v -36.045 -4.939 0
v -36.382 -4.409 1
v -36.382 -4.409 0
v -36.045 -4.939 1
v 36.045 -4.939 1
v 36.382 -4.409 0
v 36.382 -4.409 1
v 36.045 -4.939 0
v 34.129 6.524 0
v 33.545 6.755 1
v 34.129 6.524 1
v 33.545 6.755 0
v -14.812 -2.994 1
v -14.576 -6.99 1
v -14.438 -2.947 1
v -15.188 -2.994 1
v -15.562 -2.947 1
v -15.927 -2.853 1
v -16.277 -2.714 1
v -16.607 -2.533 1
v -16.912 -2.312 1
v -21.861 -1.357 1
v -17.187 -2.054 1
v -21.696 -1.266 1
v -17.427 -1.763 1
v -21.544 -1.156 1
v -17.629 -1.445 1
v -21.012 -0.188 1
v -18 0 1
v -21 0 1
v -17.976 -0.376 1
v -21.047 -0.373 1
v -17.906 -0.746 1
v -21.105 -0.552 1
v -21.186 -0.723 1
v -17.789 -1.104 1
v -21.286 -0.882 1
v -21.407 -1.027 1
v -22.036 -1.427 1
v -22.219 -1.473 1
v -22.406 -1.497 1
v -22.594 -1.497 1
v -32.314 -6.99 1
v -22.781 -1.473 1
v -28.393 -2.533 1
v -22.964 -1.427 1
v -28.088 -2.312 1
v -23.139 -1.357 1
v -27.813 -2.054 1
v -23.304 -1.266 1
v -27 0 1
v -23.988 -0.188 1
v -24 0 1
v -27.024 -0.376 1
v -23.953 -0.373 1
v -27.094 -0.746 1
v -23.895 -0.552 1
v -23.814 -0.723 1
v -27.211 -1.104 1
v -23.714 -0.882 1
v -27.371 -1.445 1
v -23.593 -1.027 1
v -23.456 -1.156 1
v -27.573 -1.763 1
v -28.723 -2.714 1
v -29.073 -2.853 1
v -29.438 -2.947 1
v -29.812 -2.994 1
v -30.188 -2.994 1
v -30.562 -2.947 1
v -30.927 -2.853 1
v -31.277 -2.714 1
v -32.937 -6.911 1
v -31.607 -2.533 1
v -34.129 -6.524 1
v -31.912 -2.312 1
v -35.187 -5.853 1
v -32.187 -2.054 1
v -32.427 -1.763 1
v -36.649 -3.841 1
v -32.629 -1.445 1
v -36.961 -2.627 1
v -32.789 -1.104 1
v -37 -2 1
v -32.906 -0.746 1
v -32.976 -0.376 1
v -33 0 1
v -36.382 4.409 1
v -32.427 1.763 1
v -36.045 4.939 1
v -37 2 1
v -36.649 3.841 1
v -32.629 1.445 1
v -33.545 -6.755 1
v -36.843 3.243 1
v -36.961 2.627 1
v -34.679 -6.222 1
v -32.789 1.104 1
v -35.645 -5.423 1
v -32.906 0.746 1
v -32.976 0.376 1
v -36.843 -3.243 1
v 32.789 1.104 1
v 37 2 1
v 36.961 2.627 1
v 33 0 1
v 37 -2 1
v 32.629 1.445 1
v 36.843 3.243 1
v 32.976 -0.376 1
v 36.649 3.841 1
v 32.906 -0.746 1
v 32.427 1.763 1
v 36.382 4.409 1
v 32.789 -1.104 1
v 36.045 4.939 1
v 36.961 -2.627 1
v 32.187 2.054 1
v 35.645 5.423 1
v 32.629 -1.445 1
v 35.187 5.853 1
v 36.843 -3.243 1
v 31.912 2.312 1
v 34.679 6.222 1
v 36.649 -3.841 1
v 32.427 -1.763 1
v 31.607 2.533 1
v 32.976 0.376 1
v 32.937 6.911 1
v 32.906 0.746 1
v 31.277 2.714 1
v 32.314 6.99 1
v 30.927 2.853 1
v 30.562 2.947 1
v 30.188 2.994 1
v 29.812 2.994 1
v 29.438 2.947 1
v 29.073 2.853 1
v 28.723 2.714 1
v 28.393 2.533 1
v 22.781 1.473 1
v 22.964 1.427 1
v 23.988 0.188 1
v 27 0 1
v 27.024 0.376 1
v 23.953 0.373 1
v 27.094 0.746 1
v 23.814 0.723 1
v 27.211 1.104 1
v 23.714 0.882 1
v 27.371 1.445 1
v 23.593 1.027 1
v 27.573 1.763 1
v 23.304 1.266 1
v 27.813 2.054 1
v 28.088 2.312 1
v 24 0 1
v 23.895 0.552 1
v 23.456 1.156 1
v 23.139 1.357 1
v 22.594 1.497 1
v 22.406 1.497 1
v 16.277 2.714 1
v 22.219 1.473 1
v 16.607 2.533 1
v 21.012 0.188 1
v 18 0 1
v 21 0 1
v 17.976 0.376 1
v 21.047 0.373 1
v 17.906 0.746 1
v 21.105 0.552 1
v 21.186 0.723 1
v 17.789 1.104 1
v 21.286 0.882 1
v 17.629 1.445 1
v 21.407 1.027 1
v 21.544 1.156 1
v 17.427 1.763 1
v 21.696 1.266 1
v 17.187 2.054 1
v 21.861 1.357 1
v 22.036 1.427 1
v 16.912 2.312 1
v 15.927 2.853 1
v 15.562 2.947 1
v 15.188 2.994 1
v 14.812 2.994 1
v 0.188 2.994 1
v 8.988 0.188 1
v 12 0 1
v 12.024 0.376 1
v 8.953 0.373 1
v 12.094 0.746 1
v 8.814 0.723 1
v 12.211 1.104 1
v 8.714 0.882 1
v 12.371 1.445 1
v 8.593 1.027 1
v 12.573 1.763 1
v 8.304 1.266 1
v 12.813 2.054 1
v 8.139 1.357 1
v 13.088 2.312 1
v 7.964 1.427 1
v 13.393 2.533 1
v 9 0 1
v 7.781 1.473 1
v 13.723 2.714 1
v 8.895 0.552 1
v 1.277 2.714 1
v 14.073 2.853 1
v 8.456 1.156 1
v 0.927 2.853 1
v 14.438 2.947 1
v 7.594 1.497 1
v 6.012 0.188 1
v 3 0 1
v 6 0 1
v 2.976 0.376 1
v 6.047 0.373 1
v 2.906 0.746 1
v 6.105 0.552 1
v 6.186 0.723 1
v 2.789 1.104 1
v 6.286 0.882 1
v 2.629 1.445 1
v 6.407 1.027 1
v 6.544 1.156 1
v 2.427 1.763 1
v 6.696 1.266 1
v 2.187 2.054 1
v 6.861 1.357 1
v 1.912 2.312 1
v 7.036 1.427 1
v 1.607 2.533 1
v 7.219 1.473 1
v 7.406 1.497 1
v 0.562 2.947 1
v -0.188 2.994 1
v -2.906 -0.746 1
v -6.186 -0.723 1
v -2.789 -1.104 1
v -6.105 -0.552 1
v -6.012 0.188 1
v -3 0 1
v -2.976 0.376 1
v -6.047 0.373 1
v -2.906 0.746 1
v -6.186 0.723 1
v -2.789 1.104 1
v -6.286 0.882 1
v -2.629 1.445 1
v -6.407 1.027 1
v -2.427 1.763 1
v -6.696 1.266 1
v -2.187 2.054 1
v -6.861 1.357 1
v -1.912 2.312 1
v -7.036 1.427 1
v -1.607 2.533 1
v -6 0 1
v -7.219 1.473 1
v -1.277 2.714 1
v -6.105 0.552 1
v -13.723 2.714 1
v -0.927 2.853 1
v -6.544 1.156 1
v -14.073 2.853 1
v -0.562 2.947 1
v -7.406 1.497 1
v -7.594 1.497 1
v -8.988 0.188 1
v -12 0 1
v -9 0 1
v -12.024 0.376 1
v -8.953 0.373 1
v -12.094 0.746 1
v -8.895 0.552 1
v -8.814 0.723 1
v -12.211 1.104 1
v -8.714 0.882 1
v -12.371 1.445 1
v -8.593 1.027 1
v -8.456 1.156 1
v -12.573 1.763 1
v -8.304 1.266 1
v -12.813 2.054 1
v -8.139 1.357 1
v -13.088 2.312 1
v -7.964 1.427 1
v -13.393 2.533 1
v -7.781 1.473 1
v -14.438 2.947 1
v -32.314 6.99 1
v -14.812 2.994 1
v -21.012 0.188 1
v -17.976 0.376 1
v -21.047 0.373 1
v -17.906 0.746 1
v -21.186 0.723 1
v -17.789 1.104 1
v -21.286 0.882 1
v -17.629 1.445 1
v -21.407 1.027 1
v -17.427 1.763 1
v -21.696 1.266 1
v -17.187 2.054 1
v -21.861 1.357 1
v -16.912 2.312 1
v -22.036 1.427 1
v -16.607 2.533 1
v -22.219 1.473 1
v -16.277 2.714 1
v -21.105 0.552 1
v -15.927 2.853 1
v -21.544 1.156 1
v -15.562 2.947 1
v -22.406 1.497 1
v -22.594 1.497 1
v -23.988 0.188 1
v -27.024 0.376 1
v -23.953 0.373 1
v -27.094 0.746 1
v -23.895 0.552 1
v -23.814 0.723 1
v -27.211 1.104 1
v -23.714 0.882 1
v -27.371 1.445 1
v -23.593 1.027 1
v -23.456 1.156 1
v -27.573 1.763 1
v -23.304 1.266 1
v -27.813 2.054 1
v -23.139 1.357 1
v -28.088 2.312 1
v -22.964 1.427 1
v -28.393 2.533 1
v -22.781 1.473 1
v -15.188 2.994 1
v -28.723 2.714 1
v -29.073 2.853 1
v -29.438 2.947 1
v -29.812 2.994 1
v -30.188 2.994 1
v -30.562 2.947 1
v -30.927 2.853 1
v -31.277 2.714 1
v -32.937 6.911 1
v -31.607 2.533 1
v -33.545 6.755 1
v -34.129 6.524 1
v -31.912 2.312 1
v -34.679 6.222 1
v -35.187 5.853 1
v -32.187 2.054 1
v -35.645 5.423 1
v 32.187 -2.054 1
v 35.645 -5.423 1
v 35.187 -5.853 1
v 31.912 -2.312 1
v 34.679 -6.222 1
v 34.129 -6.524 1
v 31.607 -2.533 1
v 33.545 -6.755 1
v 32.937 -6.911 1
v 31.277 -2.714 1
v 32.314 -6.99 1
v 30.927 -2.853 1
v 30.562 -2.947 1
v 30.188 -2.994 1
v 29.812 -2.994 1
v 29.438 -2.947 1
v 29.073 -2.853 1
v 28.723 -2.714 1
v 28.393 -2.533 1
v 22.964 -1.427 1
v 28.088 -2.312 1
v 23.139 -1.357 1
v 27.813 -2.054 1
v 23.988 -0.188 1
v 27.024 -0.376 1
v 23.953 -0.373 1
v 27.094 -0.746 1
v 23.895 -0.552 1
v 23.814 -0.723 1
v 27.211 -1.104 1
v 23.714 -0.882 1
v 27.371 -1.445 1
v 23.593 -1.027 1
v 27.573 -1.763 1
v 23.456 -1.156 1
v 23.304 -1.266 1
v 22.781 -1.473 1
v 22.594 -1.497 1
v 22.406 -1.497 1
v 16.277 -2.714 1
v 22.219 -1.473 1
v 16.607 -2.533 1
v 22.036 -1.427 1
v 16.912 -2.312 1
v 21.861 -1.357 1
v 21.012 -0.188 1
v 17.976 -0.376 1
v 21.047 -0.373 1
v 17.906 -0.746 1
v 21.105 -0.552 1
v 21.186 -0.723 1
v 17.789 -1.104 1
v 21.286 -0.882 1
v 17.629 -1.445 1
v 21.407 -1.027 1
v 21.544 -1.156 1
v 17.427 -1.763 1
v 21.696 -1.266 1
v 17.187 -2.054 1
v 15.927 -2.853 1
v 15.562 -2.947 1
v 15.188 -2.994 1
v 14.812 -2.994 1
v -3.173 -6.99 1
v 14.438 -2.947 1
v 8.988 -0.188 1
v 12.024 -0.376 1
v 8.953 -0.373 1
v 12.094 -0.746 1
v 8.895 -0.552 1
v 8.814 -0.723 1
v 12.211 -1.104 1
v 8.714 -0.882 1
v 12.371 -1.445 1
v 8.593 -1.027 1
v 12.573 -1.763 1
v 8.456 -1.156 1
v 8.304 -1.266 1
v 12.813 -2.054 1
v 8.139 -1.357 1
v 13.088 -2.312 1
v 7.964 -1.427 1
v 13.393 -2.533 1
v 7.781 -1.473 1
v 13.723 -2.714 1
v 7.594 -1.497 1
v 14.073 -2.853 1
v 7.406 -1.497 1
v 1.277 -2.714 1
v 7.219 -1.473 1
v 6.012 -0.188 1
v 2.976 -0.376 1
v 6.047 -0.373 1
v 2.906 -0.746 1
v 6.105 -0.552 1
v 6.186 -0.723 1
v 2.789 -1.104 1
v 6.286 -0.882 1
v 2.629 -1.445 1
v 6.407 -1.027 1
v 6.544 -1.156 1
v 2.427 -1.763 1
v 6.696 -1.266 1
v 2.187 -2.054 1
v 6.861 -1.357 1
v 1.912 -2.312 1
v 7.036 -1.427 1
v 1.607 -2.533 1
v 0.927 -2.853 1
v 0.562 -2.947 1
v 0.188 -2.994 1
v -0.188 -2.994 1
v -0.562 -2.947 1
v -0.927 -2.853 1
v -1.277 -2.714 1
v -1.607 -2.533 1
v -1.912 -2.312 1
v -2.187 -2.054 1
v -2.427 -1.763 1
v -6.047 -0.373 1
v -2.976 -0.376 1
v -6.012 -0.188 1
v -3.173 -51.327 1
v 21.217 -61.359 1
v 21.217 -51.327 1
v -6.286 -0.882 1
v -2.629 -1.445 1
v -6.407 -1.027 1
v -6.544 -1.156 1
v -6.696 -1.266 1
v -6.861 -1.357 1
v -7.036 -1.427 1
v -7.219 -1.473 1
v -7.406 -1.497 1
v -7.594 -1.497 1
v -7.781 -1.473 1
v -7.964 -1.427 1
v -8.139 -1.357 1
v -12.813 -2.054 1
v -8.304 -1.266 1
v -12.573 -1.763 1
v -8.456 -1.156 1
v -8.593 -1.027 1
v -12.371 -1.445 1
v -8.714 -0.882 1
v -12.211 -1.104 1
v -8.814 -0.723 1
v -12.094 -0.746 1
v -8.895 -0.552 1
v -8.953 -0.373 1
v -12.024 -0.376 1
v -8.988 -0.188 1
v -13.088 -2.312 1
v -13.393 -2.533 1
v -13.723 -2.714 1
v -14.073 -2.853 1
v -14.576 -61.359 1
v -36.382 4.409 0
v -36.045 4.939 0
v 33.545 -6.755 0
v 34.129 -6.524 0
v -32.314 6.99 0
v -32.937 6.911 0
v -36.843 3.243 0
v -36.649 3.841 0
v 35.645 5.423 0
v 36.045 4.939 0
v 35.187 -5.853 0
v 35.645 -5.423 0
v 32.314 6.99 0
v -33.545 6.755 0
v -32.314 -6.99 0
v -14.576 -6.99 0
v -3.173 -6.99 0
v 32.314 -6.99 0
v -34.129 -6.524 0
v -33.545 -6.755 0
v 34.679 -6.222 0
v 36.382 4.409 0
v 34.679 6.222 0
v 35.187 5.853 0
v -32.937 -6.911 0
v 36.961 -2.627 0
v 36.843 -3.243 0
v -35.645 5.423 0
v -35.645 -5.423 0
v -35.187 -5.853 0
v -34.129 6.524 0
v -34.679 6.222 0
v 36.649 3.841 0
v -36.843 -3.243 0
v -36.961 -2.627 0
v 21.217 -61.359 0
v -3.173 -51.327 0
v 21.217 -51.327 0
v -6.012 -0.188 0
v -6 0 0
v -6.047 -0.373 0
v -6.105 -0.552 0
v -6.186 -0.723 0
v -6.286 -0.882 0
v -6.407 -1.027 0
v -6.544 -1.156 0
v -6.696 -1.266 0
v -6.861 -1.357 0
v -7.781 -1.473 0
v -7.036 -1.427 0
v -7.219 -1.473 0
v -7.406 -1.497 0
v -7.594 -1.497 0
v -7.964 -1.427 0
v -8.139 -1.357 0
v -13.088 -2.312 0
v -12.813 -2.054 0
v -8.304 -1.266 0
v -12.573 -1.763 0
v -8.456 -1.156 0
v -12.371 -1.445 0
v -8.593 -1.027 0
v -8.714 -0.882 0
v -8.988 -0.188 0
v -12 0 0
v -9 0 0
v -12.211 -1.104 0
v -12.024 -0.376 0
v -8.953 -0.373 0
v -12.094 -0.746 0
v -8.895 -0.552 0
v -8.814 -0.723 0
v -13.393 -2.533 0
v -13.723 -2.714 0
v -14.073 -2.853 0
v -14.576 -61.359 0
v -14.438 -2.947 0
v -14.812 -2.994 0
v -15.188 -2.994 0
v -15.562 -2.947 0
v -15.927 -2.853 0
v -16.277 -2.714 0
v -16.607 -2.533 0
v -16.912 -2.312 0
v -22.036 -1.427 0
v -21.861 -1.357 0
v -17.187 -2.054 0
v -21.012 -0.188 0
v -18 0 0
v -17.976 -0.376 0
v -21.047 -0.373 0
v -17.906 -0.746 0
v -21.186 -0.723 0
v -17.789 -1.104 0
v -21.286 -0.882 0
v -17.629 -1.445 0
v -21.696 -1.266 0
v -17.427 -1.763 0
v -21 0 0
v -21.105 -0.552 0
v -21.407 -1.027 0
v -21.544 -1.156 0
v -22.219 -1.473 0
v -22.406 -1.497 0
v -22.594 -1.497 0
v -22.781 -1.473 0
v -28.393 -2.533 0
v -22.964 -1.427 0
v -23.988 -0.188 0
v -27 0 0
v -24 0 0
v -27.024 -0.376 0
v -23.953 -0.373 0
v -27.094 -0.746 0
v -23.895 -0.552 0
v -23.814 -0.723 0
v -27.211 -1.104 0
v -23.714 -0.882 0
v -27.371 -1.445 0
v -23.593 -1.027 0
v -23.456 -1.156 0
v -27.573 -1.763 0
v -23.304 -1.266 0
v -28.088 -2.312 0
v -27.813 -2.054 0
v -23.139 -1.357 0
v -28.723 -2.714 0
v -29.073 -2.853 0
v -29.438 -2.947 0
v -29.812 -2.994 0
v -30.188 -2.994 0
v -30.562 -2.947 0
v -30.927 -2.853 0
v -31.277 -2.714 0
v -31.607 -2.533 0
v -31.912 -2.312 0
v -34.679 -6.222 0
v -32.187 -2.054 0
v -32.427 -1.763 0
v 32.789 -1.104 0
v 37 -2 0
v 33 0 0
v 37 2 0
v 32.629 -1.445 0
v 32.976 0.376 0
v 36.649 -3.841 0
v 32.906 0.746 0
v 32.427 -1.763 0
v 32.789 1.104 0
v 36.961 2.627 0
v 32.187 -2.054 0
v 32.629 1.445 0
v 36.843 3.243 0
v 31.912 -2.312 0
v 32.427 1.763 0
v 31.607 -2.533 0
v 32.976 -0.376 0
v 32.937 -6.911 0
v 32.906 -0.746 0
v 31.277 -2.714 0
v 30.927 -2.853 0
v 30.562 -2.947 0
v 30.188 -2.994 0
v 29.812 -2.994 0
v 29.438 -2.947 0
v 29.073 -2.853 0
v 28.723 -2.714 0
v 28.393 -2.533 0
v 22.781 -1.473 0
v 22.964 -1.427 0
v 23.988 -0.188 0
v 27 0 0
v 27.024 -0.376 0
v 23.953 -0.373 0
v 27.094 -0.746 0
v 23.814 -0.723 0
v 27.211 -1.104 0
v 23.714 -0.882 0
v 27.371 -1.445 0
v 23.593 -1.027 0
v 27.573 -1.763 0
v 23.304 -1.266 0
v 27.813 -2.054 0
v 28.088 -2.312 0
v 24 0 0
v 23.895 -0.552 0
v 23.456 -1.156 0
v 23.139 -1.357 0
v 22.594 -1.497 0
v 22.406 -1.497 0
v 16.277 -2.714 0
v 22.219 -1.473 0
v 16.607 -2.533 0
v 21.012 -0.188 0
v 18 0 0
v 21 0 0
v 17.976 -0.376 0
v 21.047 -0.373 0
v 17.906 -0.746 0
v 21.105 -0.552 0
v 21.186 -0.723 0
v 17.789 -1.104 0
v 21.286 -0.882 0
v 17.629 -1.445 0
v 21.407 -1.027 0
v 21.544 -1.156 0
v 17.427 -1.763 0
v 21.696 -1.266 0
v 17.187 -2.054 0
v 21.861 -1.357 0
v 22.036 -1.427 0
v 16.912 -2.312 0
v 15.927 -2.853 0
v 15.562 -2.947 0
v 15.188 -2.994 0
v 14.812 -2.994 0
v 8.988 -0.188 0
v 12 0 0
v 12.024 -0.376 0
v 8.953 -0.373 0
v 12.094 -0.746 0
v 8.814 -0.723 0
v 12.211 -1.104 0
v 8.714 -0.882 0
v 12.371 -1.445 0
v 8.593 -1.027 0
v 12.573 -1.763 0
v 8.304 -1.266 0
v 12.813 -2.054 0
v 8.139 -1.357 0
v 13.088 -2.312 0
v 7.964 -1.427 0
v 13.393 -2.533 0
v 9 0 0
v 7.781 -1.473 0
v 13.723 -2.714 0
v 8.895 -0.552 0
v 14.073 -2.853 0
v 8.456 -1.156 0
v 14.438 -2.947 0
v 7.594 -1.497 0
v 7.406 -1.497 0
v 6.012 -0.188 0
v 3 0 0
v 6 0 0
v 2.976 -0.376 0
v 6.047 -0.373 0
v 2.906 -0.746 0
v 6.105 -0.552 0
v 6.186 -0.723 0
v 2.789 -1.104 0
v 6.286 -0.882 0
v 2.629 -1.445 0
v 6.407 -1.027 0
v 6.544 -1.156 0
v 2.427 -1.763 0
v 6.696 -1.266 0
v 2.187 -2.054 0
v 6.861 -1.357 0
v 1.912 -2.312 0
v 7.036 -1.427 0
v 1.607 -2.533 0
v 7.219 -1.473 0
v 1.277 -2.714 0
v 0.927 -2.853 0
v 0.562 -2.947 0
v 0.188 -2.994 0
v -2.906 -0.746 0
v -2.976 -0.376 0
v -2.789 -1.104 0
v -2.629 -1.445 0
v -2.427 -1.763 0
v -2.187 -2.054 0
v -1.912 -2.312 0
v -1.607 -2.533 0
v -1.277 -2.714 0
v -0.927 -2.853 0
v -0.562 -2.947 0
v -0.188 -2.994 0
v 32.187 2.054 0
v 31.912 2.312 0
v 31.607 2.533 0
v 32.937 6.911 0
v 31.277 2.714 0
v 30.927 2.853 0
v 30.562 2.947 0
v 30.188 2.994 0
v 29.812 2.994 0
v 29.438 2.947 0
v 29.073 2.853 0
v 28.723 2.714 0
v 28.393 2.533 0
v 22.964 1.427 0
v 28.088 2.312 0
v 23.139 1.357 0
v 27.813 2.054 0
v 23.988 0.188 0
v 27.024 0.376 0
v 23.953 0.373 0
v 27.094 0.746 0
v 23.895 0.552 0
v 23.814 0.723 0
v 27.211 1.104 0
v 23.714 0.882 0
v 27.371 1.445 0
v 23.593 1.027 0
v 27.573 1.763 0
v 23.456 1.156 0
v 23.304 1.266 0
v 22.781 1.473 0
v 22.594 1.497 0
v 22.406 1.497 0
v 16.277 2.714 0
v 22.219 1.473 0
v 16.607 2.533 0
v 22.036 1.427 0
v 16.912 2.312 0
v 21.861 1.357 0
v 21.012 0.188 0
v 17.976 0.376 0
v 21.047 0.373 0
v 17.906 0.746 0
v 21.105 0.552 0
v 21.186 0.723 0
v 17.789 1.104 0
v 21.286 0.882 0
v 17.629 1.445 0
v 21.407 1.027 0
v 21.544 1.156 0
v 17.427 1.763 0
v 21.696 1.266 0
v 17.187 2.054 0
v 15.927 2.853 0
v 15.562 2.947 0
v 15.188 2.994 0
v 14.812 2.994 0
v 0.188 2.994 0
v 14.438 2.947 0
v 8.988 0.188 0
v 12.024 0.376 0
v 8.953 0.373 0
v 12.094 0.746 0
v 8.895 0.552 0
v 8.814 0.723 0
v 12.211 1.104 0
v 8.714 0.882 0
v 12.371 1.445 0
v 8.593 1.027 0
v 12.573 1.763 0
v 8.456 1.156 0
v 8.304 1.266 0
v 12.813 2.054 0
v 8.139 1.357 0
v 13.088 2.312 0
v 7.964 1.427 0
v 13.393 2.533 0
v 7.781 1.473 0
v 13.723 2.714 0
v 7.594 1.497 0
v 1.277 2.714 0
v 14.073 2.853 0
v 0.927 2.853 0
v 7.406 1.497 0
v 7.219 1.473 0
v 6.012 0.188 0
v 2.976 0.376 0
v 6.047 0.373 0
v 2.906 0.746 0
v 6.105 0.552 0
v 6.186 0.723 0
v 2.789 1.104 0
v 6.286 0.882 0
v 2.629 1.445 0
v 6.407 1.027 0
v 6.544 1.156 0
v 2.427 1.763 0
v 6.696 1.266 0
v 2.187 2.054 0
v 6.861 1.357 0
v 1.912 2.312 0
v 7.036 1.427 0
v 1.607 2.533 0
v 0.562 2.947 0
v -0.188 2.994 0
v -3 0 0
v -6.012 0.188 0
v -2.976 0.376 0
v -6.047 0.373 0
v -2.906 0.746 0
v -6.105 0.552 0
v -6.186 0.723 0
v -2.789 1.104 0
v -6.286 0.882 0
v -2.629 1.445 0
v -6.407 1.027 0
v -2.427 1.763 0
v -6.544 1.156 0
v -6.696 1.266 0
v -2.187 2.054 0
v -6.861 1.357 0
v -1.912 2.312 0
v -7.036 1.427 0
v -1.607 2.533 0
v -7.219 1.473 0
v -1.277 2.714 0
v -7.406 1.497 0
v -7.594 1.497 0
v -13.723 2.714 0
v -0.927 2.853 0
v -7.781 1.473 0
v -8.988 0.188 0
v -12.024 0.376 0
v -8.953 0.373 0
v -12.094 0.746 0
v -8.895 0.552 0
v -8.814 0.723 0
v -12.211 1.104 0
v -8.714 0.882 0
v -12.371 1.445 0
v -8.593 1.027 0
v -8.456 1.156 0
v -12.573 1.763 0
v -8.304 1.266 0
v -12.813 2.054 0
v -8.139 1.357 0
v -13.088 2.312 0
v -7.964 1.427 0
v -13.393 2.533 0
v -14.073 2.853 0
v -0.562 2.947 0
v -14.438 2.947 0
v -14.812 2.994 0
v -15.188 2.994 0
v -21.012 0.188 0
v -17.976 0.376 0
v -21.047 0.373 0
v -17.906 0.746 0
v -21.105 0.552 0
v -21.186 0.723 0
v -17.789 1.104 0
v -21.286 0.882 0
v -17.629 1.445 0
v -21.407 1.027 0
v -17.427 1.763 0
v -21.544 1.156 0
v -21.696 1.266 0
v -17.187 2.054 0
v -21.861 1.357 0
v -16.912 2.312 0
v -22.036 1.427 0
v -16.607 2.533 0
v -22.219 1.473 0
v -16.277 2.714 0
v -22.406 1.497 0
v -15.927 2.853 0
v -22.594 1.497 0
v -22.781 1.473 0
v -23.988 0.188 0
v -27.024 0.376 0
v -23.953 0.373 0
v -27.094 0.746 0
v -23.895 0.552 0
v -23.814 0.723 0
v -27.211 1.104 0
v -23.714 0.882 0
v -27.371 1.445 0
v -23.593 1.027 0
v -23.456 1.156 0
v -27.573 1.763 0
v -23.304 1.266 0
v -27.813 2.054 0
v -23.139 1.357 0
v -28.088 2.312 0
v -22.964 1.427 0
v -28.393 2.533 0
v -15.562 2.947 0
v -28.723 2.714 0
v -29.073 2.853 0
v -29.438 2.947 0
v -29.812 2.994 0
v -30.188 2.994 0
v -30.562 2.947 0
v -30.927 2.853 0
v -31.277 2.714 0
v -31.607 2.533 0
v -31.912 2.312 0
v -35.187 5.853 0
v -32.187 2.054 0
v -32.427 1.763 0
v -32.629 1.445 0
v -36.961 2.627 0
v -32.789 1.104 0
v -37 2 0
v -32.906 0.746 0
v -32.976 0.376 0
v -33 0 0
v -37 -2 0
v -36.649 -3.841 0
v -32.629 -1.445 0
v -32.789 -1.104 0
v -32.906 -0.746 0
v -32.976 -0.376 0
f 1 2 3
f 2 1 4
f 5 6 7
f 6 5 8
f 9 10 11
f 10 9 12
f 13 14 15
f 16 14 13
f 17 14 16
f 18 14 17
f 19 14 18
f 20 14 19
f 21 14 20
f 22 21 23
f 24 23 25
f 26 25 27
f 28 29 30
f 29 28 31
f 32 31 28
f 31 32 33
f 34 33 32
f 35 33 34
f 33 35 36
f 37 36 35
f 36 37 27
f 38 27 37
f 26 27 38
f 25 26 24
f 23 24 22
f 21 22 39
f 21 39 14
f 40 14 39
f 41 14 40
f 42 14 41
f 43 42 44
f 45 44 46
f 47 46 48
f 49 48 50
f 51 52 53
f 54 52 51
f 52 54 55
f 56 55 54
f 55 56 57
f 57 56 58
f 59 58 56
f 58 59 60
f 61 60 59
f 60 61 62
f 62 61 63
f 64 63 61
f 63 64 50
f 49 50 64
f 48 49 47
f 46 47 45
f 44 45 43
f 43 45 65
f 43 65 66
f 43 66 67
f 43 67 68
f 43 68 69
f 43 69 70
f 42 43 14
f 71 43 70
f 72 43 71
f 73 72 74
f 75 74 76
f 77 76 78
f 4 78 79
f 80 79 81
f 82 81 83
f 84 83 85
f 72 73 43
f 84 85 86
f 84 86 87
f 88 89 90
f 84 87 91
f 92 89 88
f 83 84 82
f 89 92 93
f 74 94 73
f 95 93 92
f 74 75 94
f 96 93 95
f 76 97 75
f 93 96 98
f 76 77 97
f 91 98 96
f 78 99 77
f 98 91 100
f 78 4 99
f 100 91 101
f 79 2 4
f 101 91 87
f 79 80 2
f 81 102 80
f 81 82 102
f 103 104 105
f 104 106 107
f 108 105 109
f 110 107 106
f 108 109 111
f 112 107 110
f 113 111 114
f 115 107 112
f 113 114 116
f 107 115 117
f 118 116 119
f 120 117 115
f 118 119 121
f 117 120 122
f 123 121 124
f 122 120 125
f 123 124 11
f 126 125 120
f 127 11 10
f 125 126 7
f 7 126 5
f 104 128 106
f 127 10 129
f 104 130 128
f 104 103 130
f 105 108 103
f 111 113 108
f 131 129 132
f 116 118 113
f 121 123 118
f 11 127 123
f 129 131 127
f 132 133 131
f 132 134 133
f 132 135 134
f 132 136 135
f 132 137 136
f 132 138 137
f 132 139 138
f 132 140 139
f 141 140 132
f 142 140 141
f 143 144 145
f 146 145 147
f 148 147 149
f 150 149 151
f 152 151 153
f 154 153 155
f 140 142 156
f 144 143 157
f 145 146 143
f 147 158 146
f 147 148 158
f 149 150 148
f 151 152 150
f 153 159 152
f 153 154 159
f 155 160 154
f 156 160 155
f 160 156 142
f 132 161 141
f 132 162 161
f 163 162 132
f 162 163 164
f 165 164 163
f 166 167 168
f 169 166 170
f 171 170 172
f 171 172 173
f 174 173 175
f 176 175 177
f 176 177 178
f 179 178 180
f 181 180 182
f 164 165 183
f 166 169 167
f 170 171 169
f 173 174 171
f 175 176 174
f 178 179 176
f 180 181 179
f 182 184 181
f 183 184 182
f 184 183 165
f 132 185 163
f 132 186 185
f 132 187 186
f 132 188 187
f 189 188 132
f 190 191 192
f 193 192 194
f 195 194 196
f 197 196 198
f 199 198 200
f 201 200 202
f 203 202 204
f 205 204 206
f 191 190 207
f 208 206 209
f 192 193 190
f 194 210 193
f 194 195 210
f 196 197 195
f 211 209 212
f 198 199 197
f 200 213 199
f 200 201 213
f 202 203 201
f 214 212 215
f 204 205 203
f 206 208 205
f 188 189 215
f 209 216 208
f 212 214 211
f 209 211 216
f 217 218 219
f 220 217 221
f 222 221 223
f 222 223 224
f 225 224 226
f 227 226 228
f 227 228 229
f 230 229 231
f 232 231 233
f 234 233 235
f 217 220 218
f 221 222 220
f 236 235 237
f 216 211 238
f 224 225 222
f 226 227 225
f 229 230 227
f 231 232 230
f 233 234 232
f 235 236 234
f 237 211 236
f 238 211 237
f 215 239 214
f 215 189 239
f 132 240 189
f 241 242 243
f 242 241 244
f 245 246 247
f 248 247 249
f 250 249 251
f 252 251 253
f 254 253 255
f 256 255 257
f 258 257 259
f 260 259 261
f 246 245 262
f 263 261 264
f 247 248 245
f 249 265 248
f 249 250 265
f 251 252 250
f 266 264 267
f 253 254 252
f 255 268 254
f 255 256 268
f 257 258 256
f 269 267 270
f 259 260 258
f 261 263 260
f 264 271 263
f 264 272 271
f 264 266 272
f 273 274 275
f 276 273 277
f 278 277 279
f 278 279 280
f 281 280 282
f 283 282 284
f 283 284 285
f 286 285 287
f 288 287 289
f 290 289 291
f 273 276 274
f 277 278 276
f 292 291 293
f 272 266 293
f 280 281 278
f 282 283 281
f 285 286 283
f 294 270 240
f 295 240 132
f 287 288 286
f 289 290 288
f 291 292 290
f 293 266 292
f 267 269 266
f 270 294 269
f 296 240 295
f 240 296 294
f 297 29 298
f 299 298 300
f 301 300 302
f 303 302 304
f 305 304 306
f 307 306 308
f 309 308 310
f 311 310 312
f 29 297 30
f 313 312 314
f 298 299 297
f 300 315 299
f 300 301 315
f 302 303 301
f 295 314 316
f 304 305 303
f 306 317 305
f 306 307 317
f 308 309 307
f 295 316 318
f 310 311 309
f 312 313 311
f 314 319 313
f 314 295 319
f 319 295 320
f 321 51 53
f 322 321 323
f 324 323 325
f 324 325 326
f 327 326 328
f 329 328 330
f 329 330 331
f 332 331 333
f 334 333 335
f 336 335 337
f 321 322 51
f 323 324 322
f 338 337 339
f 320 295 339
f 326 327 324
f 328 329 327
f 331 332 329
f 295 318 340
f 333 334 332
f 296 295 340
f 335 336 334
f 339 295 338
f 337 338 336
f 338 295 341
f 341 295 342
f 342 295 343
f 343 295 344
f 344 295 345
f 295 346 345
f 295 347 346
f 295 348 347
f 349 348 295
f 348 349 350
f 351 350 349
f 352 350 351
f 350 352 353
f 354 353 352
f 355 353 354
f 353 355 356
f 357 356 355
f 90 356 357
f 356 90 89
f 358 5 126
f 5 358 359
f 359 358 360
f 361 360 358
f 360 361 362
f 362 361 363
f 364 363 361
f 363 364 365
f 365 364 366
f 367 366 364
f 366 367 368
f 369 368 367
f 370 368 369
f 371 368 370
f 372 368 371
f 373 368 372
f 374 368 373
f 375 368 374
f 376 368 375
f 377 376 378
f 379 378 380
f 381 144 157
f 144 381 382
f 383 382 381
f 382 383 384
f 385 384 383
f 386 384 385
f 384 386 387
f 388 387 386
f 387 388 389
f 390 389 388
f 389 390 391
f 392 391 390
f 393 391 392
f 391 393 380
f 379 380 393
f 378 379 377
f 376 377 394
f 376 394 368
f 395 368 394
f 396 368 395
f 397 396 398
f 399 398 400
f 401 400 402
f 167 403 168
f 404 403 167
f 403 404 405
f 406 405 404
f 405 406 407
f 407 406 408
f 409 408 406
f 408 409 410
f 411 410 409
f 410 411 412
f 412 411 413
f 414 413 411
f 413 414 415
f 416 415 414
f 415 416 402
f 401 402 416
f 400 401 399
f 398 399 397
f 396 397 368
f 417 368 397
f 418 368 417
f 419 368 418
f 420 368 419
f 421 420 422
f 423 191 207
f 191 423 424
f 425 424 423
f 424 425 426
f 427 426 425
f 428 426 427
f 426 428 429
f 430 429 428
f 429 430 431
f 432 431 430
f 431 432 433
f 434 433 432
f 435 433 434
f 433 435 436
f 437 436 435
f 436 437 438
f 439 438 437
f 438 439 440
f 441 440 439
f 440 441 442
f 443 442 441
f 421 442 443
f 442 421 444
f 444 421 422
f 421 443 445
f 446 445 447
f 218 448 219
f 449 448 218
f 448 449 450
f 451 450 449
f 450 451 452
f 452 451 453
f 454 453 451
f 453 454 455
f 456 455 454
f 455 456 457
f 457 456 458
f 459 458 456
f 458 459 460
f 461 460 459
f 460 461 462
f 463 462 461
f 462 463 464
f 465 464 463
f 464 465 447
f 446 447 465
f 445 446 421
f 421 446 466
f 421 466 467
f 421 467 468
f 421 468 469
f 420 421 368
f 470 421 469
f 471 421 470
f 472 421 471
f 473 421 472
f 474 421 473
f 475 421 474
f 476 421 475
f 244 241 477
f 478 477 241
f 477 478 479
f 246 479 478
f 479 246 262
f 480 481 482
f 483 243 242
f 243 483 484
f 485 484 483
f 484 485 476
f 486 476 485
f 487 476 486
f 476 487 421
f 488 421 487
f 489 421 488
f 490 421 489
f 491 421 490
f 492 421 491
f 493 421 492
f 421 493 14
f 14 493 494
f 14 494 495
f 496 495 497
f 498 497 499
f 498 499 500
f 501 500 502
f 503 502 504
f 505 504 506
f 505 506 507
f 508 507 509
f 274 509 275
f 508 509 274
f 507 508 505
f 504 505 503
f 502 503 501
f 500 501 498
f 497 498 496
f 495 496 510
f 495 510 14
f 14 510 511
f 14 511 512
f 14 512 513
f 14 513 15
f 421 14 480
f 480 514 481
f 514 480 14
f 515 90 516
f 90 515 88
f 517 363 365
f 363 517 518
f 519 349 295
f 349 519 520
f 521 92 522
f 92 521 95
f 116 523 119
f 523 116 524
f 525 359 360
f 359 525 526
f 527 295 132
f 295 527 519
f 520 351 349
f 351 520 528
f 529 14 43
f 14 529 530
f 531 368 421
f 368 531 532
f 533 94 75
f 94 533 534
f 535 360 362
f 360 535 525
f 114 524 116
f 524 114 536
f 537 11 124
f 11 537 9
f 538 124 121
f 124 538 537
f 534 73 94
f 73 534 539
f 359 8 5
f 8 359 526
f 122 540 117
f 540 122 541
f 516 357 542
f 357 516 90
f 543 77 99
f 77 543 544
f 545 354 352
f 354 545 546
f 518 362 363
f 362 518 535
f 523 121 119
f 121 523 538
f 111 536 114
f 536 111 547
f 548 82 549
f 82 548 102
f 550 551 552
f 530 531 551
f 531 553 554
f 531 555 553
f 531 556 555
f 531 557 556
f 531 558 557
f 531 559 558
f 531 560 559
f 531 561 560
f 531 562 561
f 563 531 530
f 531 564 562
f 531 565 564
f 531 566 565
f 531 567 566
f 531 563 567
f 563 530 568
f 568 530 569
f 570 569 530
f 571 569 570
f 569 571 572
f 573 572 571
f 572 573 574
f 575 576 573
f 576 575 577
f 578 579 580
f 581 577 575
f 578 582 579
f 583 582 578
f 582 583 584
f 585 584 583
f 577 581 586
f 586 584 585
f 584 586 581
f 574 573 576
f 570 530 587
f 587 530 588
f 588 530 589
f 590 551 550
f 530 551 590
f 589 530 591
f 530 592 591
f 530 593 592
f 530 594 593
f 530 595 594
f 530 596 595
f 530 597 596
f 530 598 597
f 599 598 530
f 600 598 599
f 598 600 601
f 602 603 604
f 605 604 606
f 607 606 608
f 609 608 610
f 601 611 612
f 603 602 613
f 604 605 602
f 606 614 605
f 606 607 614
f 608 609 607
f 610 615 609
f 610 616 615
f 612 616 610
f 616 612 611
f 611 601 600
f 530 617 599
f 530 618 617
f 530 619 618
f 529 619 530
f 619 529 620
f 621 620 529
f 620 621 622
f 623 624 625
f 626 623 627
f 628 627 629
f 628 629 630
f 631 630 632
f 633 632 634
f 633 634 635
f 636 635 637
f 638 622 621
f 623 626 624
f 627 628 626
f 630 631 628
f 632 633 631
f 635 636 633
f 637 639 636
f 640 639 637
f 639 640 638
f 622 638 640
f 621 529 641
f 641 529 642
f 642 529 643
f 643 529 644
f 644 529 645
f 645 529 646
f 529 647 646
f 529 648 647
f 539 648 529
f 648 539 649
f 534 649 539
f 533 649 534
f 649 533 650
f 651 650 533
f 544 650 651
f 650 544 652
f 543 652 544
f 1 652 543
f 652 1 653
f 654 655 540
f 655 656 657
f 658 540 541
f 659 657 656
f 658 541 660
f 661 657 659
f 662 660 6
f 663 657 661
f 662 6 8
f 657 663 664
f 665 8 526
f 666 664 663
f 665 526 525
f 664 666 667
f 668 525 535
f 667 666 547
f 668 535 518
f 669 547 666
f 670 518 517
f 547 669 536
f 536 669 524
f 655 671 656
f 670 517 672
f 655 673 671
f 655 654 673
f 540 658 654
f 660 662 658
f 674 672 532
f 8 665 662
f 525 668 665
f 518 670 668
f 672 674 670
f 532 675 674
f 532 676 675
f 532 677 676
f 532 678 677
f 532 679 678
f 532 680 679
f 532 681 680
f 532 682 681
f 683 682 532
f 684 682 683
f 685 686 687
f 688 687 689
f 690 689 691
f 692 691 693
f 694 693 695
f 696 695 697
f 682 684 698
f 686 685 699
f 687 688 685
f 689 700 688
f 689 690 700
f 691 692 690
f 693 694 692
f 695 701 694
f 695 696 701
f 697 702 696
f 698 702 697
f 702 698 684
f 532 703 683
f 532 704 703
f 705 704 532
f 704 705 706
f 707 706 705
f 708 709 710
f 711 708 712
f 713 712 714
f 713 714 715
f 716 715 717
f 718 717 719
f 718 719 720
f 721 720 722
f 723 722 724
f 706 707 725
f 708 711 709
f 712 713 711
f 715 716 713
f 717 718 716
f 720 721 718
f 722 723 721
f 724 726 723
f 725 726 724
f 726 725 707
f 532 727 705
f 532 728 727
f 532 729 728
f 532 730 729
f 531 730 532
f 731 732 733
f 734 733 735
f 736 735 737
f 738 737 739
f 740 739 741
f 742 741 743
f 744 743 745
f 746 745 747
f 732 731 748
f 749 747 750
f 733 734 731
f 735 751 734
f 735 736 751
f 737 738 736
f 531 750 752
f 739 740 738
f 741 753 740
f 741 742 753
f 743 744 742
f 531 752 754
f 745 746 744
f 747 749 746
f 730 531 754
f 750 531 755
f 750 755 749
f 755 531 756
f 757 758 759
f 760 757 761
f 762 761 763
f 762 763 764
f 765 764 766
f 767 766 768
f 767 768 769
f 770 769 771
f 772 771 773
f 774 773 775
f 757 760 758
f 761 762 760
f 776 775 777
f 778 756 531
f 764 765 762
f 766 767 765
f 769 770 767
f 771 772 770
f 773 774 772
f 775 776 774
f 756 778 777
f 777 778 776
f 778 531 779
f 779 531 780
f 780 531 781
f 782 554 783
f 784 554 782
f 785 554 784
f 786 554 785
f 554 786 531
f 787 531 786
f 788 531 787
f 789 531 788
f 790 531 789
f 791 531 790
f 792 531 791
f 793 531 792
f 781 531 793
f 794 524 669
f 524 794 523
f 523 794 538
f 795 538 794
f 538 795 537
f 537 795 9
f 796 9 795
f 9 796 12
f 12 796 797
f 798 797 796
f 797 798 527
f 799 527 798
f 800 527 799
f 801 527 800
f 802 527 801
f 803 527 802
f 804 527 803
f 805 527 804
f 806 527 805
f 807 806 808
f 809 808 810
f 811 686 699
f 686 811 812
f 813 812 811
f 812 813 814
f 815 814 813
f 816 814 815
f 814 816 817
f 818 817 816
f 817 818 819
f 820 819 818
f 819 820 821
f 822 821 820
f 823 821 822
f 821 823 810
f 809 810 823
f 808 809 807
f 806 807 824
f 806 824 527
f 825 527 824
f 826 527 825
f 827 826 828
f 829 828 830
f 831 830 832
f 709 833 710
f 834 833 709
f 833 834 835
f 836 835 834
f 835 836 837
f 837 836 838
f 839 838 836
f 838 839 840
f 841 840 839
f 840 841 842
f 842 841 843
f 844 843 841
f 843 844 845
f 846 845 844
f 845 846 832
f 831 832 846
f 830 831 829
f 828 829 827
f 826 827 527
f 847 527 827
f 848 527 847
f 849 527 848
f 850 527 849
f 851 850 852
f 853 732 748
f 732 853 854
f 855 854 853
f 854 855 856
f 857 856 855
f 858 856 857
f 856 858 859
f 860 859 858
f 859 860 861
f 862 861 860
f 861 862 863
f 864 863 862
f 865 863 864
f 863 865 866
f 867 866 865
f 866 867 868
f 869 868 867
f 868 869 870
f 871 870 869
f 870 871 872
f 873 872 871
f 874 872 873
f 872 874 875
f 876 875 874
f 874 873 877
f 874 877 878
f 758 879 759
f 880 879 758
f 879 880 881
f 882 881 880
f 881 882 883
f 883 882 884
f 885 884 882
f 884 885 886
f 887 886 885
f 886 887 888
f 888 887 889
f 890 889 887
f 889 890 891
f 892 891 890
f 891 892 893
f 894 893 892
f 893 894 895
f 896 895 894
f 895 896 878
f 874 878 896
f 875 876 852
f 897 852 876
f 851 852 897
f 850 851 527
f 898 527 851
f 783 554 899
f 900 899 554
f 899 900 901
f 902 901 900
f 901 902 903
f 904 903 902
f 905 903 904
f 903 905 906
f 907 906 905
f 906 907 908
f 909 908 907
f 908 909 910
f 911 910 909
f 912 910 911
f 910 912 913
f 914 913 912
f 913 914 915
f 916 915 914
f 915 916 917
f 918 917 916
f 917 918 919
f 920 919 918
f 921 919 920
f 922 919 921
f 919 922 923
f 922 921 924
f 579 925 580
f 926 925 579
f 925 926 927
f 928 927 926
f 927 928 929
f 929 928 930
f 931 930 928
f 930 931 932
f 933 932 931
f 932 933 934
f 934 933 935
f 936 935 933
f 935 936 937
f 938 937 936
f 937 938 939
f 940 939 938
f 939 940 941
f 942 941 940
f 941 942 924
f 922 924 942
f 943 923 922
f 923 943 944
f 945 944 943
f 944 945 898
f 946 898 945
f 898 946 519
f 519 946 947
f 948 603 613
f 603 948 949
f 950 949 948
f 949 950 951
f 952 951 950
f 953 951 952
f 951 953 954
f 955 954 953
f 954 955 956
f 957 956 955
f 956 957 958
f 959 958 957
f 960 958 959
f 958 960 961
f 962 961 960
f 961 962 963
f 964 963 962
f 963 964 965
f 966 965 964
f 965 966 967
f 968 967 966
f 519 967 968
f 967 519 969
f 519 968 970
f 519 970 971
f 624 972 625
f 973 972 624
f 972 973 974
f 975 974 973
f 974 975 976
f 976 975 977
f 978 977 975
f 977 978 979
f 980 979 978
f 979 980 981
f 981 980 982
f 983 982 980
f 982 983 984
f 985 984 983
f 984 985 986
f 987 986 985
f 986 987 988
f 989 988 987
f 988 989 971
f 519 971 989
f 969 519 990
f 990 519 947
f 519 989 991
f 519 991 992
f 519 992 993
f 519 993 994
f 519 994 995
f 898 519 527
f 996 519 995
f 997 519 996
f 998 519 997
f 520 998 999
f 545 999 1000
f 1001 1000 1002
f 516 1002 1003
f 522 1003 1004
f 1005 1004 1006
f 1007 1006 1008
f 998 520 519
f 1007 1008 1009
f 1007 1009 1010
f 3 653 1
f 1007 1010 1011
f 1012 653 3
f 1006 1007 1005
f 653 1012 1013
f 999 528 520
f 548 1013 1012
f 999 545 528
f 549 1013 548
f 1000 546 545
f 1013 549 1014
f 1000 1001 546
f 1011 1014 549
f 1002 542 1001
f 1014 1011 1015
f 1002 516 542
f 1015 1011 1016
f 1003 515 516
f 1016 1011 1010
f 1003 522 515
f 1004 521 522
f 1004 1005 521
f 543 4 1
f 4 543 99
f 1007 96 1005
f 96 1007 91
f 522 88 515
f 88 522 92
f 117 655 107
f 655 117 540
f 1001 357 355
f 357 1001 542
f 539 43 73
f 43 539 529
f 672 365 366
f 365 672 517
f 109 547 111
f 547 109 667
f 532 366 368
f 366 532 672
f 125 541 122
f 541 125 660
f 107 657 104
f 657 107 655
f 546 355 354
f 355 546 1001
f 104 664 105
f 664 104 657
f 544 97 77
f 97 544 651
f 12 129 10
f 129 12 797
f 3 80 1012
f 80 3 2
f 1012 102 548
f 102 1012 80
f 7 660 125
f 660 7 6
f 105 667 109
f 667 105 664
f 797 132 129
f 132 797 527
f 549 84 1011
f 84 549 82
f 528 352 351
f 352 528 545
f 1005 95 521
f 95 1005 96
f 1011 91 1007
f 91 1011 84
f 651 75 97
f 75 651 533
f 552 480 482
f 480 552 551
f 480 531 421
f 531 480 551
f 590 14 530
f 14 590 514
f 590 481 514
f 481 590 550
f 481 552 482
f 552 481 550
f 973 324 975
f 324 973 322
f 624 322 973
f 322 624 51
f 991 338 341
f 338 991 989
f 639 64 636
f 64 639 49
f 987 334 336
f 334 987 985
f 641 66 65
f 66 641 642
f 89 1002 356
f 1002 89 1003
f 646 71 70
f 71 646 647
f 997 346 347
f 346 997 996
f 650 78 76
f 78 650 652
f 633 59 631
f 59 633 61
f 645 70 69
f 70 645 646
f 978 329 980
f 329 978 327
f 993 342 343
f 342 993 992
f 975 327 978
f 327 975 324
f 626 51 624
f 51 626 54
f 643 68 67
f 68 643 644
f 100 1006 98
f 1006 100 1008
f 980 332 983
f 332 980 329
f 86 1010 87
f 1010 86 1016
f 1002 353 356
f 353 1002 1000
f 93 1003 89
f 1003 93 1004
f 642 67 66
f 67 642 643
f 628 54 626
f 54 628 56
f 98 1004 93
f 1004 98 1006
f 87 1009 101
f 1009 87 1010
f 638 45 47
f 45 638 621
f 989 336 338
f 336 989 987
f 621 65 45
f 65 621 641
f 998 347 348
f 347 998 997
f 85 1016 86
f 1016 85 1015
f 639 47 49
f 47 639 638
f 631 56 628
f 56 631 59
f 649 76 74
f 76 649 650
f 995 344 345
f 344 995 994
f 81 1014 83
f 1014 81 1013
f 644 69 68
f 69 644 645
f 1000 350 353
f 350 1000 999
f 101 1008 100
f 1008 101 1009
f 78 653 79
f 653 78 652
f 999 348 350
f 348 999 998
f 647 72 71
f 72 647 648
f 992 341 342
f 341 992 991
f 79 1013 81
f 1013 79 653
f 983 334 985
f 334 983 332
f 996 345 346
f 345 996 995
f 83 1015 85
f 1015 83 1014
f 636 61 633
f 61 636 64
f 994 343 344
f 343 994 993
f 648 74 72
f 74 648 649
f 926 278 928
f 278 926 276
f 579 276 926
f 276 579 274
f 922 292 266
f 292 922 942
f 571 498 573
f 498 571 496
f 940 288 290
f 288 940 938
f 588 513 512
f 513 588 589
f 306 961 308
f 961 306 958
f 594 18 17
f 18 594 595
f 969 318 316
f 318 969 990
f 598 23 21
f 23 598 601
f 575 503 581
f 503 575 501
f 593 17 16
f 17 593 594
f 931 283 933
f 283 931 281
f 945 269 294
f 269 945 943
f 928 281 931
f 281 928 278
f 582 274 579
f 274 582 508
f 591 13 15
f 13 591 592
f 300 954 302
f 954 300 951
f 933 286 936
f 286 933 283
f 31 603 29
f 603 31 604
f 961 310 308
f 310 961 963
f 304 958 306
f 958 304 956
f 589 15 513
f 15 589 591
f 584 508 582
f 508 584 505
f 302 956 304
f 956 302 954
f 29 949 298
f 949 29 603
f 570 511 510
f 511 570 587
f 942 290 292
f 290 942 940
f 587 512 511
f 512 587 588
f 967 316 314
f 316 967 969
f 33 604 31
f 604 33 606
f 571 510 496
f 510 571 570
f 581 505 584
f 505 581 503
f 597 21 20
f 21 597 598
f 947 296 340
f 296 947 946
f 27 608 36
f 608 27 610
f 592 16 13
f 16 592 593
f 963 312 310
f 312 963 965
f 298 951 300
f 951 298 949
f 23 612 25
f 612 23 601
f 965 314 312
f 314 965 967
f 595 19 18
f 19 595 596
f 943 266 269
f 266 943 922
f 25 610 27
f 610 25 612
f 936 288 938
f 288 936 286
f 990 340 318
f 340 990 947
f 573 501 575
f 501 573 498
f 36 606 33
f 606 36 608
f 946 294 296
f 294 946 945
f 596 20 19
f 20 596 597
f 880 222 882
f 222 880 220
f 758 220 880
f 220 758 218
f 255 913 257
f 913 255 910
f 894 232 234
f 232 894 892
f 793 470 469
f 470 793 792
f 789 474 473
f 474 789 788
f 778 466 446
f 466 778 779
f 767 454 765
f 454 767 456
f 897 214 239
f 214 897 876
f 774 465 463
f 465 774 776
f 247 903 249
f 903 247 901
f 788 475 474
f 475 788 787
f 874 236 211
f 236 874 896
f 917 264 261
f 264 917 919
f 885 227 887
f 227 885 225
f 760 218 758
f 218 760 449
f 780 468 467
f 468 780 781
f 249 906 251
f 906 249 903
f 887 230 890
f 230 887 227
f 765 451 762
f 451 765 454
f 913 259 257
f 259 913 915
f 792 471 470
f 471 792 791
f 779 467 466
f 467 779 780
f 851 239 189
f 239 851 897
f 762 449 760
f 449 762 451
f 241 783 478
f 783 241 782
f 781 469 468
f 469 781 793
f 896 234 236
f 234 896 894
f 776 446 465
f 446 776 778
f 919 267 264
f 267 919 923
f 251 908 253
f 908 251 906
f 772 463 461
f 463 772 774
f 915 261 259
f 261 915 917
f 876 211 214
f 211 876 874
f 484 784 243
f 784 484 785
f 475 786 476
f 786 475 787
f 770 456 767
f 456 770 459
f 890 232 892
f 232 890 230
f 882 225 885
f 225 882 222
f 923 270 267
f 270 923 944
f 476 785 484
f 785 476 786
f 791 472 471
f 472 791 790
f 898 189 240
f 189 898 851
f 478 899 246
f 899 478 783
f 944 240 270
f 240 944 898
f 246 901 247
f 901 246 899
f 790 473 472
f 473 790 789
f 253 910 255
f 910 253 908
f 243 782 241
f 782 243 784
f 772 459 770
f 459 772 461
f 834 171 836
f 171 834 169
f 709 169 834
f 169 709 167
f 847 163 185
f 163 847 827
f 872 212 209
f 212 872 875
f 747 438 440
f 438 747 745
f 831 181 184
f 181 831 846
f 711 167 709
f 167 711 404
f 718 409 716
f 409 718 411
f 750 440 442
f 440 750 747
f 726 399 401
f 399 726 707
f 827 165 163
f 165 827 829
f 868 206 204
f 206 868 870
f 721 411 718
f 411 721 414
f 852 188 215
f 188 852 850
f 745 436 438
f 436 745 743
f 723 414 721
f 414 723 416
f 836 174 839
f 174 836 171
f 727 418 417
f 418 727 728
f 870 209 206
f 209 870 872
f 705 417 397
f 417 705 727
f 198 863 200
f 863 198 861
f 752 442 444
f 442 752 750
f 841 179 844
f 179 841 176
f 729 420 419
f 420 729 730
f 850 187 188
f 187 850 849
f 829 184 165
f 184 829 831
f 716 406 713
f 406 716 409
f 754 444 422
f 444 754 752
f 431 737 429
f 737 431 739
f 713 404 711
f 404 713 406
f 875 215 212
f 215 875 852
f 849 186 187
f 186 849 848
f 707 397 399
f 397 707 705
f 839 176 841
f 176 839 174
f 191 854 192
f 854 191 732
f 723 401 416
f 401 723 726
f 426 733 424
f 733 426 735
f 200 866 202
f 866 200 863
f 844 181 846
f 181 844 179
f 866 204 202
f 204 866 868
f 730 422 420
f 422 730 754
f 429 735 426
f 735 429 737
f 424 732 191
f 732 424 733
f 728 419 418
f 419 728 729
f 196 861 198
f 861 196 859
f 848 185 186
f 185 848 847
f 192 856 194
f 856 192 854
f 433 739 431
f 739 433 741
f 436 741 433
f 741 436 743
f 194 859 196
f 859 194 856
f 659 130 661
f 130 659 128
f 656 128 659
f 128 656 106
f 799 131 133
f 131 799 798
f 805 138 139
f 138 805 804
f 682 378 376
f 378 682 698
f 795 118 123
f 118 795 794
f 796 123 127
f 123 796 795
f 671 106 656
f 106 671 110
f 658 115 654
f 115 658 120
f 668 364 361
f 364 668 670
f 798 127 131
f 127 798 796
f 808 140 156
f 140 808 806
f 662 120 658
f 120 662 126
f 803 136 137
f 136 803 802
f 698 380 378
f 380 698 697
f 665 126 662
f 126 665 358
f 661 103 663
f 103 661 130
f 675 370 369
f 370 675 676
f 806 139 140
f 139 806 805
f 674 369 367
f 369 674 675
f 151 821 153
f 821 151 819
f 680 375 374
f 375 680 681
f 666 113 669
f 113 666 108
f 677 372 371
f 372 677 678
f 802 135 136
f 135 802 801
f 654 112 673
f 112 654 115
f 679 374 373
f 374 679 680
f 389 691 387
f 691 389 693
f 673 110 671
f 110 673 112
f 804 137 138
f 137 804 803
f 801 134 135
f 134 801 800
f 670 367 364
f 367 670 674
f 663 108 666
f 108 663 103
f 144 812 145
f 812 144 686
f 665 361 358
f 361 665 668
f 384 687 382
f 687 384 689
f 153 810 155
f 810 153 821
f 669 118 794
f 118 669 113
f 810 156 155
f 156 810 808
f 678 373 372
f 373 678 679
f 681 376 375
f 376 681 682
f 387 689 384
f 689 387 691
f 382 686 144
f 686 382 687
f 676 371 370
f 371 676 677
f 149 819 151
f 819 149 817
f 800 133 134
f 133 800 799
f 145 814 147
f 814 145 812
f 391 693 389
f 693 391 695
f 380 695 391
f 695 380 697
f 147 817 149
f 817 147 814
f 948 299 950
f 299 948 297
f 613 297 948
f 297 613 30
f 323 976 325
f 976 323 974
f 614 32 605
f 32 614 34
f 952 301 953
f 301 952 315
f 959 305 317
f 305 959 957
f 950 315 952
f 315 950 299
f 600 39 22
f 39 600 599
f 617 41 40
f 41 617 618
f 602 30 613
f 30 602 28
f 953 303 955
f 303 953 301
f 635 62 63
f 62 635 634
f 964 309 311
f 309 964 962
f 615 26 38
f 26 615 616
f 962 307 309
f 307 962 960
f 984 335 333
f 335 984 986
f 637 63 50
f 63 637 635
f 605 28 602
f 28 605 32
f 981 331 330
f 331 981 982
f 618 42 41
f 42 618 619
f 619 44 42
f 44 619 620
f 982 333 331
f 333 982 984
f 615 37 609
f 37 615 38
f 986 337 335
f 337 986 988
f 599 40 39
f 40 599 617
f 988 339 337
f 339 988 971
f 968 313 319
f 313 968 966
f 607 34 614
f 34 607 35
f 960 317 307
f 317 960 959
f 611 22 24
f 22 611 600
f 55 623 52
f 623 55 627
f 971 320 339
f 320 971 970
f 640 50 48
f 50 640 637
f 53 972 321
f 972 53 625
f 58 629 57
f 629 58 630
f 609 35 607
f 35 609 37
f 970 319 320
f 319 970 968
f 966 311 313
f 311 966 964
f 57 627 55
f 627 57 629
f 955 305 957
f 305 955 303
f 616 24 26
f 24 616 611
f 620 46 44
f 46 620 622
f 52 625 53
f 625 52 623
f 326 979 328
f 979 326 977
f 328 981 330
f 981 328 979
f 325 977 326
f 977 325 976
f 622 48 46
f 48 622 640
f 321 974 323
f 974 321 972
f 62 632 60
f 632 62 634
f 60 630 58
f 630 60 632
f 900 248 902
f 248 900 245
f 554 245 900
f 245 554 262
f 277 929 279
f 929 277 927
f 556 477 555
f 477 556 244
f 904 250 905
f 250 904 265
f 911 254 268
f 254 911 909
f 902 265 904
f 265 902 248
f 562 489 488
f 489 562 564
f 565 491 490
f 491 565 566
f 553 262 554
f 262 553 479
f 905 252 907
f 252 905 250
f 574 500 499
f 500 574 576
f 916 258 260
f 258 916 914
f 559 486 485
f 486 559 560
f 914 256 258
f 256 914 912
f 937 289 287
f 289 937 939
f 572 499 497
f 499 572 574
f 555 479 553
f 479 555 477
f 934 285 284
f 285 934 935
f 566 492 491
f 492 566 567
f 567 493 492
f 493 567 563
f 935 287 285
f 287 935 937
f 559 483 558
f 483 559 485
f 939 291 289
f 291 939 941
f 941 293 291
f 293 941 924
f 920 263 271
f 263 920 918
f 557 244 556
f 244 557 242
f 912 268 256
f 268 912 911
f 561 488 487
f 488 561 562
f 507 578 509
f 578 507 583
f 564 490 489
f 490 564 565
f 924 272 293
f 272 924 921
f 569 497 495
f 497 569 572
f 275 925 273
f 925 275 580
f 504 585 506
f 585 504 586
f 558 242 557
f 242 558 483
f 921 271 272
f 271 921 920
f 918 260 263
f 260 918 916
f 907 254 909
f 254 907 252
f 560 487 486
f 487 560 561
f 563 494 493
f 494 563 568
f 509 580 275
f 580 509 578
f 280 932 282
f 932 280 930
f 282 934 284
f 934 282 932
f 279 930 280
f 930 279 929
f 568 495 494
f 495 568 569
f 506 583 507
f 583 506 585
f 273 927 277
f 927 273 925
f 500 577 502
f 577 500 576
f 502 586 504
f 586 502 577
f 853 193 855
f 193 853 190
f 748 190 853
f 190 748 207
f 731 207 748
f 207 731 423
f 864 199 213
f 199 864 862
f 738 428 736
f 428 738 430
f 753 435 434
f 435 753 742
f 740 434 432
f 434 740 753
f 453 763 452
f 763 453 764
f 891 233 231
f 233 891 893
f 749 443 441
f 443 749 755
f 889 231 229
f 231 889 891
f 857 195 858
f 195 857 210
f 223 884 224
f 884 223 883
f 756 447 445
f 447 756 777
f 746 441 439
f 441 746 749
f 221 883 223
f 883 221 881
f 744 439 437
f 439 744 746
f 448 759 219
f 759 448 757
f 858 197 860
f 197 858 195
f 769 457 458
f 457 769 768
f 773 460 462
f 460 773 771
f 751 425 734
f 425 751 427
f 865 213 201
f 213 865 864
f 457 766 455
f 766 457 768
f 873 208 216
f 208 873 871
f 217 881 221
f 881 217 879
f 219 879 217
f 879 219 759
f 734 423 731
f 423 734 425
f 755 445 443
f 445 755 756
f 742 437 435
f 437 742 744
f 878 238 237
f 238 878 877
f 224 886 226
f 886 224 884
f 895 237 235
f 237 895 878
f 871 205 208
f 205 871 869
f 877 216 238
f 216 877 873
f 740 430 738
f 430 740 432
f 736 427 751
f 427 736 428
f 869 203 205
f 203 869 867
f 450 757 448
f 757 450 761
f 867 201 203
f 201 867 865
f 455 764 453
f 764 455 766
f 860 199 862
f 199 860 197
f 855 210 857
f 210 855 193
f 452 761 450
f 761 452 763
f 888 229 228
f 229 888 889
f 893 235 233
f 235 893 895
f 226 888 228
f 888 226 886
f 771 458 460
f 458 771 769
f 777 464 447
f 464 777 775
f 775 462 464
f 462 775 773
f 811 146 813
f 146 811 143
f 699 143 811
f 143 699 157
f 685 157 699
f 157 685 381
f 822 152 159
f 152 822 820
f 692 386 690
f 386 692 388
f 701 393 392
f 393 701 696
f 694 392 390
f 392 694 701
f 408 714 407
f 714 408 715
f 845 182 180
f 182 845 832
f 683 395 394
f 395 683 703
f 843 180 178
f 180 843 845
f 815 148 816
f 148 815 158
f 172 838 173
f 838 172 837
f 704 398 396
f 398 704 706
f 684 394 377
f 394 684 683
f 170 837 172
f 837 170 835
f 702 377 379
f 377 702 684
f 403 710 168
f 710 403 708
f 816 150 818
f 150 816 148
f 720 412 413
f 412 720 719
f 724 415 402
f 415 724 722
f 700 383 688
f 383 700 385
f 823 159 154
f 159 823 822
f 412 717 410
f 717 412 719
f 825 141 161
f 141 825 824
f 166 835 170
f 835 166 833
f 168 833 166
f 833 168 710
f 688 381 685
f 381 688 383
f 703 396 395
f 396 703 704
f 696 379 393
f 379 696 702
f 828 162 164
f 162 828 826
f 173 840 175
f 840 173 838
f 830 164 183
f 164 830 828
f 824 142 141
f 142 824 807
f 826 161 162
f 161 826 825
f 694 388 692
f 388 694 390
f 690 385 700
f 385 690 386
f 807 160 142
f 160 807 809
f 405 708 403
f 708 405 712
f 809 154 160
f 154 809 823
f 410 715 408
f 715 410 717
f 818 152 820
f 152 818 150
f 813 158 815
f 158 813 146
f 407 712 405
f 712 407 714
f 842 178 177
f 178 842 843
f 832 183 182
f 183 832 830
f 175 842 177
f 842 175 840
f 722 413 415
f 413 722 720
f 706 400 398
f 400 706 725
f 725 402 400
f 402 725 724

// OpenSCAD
$fn = 50;


difference() {
	union() {
		*color(alpha = 1.0000000000, c = "gray") {
			translate(v = [0, 14, 0]) {
				linear_extrude(height = 1) {
					text(font = "Arial:style=Bold", halign = "center", size = 4.5000000000, text = "COMMENT description oobb_plate_shape_p_type_1_depth_5_width_1_thickness_l_extra_oobb_size", valign = "center");
				}
			}
		}
		hull() {
			translate(v = [-32.0000000000, 2.0000000000, 0]) {
				cylinder(h = 1, r = 5);
			}
			translate(v = [32.0000000000, 2.0000000000, 0]) {
				cylinder(h = 1, r = 5);
			}
			translate(v = [-32.0000000000, -2.0000000000, 0]) {
				cylinder(h = 1, r = 5);
			}
			translate(v = [32.0000000000, -2.0000000000, 0]) {
				cylinder(h = 1, r = 5);
			}
		}
		translate(v = [0, -5, 0]) {
			linear_extrude(height = 1) {
				text(font = "DejaVu Sans Mono:style=Bold", halign = "center", size = 57.0000000000, text = "L", valign = "top");
			}
		}
	}
	union() {
		*color(alpha = 1.0000000000, c = "gray") {
			translate(v = [0, 14, 0]) {
				linear_extrude(height = 1) {
					text(font = "Arial:style=Bold", halign = "center", size = 4.5000000000, text = "COMMENT description oobb_holes_shape_n_type_5_width_1_thickness_l_extra_oobb_size_1_height_'all'_holes_true_both_holes", valign = "center");
				}
			}
		}
		translate(v = [-30.0000000000, 0.0000000000, 0]) {
			translate(v = [0, 0, -50]) {
				cylinder(h = 100, r = 3.0000000000);
			}
		}
		translate(v = [-15.0000000000, 0.0000000000, 0]) {
			translate(v = [0, 0, -50]) {
				cylinder(h = 100, r = 3.0000000000);
			}
		}
		translate(v = [0, 0, -50]) {
			cylinder(h = 100, r = 3.0000000000);
		}
		translate(v = [15.0000000000, 0.0000000000, 0]) {
			translate(v = [0, 0, -50]) {
				cylinder(h = 100, r = 3.0000000000);
			}
		}
		translate(v = [30.0000000000, 0.0000000000, 0]) {
			translate(v = [0, 0, -50]) {
				cylinder(h = 100, r = 3.0000000000);
			}
		}
		translate(v = [-30.0000000000, 0.0000000000, 0]) {
			translate(v = [0, 0, -50]) {
				cylinder(h = 100, r = 1.5000000000);
			}
		}
		translate(v = [-22.5000000000, 0.0000000000, 0]) {
			translate(v = [0, 0, -50]) {
				cylinder(h = 100, r = 1.5000000000);
			}
		}
		translate(v = [-15.0000000000, 0.0000000000, 0]) {
			translate(v = [0, 0, -50]) {
				cylinder(h = 100, r = 1.5000000000);
			}
		}
		translate(v = [-7.5000000000, 0.0000000000, 0]) {
			translate(v = [0, 0, -50]) {
				cylinder(h = 100, r = 1.5000000000);
			}
		}
		translate(v = [0, 0, -50]) {
			cylinder(h = 100, r = 1.5000000000);
		}
		translate(v = [7.5000000000, 0.0000000000, 0]) {
			translate(v = [0, 0, -50]) {
				cylinder(h = 100, r = 1.5000000000);
			}
		}
		translate(v = [15.0000000000, 0.0000000000, 0]) {
			translate(v = [0, 0, -50]) {
				cylinder(h = 100, r = 1.5000000000);
			}
		}
		translate(v = [22.5000000000, 0.0000000000, 0]) {
			translate(v = [0, 0, -50]) {
				cylinder(h = 100, r = 1.5000000000);
			}
		}
		translate(v = [30.0000000000, 0.0000000000, 0]) {
			translate(v = [0, 0, -50]) {
				cylinder(h = 100, r = 1.5000000000);
			}
		}
	}
}
